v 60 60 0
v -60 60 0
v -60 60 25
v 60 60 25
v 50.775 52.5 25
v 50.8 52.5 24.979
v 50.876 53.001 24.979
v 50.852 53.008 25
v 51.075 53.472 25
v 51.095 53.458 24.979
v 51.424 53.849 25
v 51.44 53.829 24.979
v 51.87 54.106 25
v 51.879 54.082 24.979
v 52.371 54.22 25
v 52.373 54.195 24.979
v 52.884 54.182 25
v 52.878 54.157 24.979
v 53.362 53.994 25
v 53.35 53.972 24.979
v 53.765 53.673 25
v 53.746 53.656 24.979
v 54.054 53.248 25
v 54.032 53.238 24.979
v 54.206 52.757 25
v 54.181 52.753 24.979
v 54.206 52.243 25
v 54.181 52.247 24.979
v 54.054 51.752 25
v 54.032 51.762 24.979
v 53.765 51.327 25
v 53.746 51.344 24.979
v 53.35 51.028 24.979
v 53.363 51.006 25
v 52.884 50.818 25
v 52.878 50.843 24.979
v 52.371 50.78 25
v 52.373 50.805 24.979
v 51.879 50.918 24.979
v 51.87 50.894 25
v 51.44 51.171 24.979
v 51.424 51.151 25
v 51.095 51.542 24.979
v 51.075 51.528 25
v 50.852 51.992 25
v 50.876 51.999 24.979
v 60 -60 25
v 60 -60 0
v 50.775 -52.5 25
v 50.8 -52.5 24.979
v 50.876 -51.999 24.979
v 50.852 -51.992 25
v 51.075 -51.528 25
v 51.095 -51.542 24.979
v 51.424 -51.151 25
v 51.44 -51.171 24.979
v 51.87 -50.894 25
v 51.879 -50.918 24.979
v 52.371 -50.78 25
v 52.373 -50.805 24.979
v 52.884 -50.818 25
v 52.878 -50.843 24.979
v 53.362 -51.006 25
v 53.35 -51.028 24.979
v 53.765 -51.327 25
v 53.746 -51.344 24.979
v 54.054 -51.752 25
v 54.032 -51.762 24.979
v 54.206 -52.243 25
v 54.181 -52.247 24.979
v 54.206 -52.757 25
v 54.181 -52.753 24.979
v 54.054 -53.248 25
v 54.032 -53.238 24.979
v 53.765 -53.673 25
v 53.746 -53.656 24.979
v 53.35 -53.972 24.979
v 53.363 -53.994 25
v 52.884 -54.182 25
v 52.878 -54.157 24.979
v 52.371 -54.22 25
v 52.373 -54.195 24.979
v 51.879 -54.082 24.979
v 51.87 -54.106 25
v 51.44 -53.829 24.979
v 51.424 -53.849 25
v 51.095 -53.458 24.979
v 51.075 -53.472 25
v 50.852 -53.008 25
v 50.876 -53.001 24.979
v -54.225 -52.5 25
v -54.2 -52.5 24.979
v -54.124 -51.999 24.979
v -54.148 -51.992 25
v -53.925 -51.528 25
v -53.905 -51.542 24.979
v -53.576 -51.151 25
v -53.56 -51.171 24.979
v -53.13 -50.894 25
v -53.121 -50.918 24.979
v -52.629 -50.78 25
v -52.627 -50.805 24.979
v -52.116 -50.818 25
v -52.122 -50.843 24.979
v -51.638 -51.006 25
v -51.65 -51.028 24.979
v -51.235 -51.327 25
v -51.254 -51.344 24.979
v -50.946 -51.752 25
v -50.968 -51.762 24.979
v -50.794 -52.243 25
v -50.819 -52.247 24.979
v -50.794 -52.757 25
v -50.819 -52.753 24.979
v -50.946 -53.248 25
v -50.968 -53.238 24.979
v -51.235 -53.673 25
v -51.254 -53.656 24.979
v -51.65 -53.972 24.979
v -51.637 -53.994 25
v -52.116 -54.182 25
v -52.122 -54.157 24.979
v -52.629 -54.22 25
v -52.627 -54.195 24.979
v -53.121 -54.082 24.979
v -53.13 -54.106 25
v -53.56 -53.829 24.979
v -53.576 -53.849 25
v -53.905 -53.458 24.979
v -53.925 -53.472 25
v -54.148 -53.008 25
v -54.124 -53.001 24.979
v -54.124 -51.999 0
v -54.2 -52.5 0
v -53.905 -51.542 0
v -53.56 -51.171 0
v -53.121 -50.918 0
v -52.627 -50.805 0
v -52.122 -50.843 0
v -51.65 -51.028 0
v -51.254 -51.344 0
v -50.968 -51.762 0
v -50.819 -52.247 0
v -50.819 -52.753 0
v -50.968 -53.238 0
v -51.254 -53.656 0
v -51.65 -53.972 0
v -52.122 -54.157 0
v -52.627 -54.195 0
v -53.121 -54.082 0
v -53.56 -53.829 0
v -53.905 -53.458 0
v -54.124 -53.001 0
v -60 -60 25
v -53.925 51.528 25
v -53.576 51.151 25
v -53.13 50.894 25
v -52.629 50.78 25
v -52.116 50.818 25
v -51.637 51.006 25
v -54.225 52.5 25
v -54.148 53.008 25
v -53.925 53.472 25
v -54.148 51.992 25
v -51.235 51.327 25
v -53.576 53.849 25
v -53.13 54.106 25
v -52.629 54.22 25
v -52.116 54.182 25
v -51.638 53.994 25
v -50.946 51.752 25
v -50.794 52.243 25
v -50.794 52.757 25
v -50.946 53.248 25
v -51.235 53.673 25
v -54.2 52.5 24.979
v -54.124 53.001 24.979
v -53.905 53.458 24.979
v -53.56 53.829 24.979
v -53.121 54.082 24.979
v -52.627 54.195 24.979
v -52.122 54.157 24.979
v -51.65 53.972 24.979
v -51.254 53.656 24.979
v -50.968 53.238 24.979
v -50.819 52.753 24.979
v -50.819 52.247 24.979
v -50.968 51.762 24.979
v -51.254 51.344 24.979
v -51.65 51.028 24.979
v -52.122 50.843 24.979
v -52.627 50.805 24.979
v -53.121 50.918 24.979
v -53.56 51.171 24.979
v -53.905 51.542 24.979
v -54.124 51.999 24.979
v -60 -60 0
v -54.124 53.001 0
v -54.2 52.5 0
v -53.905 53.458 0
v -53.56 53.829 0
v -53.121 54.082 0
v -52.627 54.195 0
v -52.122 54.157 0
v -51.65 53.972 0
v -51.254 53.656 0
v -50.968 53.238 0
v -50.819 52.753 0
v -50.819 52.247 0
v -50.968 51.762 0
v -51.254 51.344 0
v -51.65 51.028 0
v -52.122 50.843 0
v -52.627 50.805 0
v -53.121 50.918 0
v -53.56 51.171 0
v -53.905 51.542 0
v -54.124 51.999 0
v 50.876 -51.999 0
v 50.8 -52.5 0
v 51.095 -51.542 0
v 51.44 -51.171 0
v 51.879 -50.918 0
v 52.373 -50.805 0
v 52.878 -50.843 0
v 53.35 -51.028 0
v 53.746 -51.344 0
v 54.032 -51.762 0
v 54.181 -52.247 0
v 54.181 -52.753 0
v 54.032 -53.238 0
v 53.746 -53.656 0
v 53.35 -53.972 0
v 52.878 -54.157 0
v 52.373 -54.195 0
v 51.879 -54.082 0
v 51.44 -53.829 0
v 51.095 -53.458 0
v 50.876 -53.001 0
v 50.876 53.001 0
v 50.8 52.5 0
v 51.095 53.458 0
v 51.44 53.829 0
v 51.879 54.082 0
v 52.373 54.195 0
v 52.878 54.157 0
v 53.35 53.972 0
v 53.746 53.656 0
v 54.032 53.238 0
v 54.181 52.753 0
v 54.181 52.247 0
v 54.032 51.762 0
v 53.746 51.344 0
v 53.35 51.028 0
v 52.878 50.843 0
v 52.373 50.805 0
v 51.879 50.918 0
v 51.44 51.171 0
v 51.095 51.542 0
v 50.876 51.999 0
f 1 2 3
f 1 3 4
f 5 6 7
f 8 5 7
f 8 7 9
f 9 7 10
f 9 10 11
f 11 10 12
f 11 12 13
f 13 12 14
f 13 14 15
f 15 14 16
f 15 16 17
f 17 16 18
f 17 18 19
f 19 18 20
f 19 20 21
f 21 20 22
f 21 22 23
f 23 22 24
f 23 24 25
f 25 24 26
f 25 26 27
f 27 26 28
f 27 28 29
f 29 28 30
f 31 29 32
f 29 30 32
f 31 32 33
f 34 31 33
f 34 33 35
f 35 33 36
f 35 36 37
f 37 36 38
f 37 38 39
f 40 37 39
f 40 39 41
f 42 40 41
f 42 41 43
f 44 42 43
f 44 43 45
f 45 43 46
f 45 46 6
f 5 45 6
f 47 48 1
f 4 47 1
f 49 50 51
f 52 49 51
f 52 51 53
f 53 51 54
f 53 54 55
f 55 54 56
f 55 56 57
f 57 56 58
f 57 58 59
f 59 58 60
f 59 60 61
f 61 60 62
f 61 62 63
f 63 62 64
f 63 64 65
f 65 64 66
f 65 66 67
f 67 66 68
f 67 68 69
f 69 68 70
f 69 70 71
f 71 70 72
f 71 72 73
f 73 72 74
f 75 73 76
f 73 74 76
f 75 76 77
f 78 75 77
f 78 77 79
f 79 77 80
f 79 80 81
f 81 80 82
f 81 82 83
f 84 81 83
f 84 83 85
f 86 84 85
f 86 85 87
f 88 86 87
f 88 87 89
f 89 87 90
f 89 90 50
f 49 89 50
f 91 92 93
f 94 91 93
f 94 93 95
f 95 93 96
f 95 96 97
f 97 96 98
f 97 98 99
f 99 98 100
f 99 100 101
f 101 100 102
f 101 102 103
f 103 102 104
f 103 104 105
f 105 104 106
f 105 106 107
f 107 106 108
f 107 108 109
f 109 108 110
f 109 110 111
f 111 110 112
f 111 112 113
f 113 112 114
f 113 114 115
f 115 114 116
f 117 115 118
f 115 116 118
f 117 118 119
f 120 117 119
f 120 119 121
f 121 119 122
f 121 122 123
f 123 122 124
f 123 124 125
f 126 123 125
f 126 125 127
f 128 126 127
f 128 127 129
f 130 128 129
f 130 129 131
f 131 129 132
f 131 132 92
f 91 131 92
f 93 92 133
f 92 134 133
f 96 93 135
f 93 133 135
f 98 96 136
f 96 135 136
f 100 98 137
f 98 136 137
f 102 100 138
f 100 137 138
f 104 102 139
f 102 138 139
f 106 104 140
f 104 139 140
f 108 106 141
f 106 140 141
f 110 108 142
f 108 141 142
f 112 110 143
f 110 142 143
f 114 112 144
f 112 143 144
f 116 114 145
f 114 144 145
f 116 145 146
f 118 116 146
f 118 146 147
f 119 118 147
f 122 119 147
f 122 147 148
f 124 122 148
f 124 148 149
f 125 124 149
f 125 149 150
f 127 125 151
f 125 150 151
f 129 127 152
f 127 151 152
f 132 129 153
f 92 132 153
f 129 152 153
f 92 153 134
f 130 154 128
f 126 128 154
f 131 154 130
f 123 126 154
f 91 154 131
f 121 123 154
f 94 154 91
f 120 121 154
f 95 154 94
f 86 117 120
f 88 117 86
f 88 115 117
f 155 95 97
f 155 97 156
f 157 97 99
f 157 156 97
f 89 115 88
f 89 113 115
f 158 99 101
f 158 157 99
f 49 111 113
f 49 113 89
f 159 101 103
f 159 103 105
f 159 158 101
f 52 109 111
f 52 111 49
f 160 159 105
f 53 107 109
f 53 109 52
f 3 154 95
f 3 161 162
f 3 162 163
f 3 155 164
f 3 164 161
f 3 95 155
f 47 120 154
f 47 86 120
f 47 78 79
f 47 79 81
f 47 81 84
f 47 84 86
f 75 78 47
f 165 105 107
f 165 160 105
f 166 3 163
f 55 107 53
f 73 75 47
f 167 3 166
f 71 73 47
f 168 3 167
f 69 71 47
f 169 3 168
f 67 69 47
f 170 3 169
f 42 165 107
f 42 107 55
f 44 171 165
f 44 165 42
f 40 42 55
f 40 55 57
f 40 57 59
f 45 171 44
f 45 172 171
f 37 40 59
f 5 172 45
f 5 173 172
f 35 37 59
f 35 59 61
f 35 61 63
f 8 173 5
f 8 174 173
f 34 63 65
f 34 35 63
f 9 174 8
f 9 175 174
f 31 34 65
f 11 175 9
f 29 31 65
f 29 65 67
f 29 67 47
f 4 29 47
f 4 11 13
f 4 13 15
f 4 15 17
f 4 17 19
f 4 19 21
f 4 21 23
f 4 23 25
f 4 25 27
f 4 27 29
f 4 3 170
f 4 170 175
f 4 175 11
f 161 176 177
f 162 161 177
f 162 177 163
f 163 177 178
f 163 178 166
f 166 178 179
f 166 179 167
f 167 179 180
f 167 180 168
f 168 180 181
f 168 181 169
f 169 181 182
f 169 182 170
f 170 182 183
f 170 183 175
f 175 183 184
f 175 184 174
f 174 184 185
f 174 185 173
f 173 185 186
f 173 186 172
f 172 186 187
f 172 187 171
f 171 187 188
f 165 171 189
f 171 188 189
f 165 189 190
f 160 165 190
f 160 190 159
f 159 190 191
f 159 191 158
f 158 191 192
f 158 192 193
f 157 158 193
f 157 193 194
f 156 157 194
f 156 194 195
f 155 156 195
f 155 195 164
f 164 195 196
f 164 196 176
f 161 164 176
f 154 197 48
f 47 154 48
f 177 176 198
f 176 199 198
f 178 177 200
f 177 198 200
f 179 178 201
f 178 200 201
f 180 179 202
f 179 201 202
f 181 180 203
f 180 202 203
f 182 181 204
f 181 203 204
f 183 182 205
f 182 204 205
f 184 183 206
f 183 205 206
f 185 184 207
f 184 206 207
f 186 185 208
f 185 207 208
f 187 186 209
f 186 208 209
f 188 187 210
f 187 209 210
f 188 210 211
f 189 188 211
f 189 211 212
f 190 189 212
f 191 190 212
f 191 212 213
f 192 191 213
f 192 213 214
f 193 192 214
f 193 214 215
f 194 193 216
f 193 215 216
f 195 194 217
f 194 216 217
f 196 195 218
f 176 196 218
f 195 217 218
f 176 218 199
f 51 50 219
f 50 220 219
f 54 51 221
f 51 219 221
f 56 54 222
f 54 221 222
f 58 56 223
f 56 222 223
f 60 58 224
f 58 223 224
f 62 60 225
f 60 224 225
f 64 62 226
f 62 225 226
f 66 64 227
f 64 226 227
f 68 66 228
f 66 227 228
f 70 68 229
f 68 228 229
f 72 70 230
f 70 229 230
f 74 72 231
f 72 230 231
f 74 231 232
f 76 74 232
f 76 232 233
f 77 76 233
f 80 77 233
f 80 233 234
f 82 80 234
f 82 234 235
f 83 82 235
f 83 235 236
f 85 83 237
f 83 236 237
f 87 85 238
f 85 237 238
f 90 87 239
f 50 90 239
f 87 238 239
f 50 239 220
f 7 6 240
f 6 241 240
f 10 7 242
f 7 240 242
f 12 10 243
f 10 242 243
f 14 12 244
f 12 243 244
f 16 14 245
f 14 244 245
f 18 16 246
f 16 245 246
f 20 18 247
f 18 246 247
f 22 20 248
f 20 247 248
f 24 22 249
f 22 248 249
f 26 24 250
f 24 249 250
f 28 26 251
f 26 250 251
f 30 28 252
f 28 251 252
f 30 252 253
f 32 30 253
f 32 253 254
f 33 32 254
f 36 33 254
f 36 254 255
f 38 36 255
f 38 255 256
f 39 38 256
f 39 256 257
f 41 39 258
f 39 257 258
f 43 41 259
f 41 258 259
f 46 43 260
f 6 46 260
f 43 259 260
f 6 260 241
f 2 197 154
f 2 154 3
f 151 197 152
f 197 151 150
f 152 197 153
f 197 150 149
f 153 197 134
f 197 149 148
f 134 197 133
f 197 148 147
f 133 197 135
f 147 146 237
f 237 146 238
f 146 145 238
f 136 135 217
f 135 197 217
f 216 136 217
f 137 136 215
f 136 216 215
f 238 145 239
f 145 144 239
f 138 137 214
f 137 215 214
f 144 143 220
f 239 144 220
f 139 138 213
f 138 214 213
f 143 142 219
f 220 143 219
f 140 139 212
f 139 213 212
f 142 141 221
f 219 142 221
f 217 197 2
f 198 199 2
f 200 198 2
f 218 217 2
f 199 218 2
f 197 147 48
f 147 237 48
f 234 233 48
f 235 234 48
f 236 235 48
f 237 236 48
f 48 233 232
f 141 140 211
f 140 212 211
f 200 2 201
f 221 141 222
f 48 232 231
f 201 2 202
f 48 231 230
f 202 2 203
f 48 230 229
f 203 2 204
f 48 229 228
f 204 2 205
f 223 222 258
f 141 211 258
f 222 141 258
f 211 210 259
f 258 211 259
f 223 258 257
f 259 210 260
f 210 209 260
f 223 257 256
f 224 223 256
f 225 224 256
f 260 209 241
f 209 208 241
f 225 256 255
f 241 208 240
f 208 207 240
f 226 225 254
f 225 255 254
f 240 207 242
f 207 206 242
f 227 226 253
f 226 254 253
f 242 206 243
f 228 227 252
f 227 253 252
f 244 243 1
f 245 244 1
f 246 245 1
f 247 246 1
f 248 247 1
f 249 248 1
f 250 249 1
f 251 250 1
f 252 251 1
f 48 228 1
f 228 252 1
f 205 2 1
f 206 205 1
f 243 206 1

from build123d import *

# Parameters (mm, degrees)
SKETCH1_W                      = 120
SKETCH1_H                      = 120
BOSS_EXTRUDE1_DEPTH            = 25
M3_CLEARANCE_HOLE1_D           = 3.4
M3_CLEARANCE_HOLE1_CSINK_D     = 3.45
M3_CLEARANCE_HOLE1_CSINK_ANGLE = 100


with BuildPart() as part:
    # Sketch1 → Boss-Extrude1 (new body)
    with BuildSketch(Plane.XY):
        Rectangle(SKETCH1_W, SKETCH1_H)
    extrude(amount=BOSS_EXTRUDE1_DEPTH)

    # M3 Clearance Hole1 (through all)
    with Locations(Plane.XY.offset(25)):
        with Locations((-52.5, 52.5), (52.5, 52.5), (52.5, -52.5), (-52.5, -52.5)):
            CounterSinkHole(M3_CLEARANCE_HOLE1_D / 2, M3_CLEARANCE_HOLE1_CSINK_D / 2, counter_sink_angle=M3_CLEARANCE_HOLE1_CSINK_ANGLE)


solid = part.part
